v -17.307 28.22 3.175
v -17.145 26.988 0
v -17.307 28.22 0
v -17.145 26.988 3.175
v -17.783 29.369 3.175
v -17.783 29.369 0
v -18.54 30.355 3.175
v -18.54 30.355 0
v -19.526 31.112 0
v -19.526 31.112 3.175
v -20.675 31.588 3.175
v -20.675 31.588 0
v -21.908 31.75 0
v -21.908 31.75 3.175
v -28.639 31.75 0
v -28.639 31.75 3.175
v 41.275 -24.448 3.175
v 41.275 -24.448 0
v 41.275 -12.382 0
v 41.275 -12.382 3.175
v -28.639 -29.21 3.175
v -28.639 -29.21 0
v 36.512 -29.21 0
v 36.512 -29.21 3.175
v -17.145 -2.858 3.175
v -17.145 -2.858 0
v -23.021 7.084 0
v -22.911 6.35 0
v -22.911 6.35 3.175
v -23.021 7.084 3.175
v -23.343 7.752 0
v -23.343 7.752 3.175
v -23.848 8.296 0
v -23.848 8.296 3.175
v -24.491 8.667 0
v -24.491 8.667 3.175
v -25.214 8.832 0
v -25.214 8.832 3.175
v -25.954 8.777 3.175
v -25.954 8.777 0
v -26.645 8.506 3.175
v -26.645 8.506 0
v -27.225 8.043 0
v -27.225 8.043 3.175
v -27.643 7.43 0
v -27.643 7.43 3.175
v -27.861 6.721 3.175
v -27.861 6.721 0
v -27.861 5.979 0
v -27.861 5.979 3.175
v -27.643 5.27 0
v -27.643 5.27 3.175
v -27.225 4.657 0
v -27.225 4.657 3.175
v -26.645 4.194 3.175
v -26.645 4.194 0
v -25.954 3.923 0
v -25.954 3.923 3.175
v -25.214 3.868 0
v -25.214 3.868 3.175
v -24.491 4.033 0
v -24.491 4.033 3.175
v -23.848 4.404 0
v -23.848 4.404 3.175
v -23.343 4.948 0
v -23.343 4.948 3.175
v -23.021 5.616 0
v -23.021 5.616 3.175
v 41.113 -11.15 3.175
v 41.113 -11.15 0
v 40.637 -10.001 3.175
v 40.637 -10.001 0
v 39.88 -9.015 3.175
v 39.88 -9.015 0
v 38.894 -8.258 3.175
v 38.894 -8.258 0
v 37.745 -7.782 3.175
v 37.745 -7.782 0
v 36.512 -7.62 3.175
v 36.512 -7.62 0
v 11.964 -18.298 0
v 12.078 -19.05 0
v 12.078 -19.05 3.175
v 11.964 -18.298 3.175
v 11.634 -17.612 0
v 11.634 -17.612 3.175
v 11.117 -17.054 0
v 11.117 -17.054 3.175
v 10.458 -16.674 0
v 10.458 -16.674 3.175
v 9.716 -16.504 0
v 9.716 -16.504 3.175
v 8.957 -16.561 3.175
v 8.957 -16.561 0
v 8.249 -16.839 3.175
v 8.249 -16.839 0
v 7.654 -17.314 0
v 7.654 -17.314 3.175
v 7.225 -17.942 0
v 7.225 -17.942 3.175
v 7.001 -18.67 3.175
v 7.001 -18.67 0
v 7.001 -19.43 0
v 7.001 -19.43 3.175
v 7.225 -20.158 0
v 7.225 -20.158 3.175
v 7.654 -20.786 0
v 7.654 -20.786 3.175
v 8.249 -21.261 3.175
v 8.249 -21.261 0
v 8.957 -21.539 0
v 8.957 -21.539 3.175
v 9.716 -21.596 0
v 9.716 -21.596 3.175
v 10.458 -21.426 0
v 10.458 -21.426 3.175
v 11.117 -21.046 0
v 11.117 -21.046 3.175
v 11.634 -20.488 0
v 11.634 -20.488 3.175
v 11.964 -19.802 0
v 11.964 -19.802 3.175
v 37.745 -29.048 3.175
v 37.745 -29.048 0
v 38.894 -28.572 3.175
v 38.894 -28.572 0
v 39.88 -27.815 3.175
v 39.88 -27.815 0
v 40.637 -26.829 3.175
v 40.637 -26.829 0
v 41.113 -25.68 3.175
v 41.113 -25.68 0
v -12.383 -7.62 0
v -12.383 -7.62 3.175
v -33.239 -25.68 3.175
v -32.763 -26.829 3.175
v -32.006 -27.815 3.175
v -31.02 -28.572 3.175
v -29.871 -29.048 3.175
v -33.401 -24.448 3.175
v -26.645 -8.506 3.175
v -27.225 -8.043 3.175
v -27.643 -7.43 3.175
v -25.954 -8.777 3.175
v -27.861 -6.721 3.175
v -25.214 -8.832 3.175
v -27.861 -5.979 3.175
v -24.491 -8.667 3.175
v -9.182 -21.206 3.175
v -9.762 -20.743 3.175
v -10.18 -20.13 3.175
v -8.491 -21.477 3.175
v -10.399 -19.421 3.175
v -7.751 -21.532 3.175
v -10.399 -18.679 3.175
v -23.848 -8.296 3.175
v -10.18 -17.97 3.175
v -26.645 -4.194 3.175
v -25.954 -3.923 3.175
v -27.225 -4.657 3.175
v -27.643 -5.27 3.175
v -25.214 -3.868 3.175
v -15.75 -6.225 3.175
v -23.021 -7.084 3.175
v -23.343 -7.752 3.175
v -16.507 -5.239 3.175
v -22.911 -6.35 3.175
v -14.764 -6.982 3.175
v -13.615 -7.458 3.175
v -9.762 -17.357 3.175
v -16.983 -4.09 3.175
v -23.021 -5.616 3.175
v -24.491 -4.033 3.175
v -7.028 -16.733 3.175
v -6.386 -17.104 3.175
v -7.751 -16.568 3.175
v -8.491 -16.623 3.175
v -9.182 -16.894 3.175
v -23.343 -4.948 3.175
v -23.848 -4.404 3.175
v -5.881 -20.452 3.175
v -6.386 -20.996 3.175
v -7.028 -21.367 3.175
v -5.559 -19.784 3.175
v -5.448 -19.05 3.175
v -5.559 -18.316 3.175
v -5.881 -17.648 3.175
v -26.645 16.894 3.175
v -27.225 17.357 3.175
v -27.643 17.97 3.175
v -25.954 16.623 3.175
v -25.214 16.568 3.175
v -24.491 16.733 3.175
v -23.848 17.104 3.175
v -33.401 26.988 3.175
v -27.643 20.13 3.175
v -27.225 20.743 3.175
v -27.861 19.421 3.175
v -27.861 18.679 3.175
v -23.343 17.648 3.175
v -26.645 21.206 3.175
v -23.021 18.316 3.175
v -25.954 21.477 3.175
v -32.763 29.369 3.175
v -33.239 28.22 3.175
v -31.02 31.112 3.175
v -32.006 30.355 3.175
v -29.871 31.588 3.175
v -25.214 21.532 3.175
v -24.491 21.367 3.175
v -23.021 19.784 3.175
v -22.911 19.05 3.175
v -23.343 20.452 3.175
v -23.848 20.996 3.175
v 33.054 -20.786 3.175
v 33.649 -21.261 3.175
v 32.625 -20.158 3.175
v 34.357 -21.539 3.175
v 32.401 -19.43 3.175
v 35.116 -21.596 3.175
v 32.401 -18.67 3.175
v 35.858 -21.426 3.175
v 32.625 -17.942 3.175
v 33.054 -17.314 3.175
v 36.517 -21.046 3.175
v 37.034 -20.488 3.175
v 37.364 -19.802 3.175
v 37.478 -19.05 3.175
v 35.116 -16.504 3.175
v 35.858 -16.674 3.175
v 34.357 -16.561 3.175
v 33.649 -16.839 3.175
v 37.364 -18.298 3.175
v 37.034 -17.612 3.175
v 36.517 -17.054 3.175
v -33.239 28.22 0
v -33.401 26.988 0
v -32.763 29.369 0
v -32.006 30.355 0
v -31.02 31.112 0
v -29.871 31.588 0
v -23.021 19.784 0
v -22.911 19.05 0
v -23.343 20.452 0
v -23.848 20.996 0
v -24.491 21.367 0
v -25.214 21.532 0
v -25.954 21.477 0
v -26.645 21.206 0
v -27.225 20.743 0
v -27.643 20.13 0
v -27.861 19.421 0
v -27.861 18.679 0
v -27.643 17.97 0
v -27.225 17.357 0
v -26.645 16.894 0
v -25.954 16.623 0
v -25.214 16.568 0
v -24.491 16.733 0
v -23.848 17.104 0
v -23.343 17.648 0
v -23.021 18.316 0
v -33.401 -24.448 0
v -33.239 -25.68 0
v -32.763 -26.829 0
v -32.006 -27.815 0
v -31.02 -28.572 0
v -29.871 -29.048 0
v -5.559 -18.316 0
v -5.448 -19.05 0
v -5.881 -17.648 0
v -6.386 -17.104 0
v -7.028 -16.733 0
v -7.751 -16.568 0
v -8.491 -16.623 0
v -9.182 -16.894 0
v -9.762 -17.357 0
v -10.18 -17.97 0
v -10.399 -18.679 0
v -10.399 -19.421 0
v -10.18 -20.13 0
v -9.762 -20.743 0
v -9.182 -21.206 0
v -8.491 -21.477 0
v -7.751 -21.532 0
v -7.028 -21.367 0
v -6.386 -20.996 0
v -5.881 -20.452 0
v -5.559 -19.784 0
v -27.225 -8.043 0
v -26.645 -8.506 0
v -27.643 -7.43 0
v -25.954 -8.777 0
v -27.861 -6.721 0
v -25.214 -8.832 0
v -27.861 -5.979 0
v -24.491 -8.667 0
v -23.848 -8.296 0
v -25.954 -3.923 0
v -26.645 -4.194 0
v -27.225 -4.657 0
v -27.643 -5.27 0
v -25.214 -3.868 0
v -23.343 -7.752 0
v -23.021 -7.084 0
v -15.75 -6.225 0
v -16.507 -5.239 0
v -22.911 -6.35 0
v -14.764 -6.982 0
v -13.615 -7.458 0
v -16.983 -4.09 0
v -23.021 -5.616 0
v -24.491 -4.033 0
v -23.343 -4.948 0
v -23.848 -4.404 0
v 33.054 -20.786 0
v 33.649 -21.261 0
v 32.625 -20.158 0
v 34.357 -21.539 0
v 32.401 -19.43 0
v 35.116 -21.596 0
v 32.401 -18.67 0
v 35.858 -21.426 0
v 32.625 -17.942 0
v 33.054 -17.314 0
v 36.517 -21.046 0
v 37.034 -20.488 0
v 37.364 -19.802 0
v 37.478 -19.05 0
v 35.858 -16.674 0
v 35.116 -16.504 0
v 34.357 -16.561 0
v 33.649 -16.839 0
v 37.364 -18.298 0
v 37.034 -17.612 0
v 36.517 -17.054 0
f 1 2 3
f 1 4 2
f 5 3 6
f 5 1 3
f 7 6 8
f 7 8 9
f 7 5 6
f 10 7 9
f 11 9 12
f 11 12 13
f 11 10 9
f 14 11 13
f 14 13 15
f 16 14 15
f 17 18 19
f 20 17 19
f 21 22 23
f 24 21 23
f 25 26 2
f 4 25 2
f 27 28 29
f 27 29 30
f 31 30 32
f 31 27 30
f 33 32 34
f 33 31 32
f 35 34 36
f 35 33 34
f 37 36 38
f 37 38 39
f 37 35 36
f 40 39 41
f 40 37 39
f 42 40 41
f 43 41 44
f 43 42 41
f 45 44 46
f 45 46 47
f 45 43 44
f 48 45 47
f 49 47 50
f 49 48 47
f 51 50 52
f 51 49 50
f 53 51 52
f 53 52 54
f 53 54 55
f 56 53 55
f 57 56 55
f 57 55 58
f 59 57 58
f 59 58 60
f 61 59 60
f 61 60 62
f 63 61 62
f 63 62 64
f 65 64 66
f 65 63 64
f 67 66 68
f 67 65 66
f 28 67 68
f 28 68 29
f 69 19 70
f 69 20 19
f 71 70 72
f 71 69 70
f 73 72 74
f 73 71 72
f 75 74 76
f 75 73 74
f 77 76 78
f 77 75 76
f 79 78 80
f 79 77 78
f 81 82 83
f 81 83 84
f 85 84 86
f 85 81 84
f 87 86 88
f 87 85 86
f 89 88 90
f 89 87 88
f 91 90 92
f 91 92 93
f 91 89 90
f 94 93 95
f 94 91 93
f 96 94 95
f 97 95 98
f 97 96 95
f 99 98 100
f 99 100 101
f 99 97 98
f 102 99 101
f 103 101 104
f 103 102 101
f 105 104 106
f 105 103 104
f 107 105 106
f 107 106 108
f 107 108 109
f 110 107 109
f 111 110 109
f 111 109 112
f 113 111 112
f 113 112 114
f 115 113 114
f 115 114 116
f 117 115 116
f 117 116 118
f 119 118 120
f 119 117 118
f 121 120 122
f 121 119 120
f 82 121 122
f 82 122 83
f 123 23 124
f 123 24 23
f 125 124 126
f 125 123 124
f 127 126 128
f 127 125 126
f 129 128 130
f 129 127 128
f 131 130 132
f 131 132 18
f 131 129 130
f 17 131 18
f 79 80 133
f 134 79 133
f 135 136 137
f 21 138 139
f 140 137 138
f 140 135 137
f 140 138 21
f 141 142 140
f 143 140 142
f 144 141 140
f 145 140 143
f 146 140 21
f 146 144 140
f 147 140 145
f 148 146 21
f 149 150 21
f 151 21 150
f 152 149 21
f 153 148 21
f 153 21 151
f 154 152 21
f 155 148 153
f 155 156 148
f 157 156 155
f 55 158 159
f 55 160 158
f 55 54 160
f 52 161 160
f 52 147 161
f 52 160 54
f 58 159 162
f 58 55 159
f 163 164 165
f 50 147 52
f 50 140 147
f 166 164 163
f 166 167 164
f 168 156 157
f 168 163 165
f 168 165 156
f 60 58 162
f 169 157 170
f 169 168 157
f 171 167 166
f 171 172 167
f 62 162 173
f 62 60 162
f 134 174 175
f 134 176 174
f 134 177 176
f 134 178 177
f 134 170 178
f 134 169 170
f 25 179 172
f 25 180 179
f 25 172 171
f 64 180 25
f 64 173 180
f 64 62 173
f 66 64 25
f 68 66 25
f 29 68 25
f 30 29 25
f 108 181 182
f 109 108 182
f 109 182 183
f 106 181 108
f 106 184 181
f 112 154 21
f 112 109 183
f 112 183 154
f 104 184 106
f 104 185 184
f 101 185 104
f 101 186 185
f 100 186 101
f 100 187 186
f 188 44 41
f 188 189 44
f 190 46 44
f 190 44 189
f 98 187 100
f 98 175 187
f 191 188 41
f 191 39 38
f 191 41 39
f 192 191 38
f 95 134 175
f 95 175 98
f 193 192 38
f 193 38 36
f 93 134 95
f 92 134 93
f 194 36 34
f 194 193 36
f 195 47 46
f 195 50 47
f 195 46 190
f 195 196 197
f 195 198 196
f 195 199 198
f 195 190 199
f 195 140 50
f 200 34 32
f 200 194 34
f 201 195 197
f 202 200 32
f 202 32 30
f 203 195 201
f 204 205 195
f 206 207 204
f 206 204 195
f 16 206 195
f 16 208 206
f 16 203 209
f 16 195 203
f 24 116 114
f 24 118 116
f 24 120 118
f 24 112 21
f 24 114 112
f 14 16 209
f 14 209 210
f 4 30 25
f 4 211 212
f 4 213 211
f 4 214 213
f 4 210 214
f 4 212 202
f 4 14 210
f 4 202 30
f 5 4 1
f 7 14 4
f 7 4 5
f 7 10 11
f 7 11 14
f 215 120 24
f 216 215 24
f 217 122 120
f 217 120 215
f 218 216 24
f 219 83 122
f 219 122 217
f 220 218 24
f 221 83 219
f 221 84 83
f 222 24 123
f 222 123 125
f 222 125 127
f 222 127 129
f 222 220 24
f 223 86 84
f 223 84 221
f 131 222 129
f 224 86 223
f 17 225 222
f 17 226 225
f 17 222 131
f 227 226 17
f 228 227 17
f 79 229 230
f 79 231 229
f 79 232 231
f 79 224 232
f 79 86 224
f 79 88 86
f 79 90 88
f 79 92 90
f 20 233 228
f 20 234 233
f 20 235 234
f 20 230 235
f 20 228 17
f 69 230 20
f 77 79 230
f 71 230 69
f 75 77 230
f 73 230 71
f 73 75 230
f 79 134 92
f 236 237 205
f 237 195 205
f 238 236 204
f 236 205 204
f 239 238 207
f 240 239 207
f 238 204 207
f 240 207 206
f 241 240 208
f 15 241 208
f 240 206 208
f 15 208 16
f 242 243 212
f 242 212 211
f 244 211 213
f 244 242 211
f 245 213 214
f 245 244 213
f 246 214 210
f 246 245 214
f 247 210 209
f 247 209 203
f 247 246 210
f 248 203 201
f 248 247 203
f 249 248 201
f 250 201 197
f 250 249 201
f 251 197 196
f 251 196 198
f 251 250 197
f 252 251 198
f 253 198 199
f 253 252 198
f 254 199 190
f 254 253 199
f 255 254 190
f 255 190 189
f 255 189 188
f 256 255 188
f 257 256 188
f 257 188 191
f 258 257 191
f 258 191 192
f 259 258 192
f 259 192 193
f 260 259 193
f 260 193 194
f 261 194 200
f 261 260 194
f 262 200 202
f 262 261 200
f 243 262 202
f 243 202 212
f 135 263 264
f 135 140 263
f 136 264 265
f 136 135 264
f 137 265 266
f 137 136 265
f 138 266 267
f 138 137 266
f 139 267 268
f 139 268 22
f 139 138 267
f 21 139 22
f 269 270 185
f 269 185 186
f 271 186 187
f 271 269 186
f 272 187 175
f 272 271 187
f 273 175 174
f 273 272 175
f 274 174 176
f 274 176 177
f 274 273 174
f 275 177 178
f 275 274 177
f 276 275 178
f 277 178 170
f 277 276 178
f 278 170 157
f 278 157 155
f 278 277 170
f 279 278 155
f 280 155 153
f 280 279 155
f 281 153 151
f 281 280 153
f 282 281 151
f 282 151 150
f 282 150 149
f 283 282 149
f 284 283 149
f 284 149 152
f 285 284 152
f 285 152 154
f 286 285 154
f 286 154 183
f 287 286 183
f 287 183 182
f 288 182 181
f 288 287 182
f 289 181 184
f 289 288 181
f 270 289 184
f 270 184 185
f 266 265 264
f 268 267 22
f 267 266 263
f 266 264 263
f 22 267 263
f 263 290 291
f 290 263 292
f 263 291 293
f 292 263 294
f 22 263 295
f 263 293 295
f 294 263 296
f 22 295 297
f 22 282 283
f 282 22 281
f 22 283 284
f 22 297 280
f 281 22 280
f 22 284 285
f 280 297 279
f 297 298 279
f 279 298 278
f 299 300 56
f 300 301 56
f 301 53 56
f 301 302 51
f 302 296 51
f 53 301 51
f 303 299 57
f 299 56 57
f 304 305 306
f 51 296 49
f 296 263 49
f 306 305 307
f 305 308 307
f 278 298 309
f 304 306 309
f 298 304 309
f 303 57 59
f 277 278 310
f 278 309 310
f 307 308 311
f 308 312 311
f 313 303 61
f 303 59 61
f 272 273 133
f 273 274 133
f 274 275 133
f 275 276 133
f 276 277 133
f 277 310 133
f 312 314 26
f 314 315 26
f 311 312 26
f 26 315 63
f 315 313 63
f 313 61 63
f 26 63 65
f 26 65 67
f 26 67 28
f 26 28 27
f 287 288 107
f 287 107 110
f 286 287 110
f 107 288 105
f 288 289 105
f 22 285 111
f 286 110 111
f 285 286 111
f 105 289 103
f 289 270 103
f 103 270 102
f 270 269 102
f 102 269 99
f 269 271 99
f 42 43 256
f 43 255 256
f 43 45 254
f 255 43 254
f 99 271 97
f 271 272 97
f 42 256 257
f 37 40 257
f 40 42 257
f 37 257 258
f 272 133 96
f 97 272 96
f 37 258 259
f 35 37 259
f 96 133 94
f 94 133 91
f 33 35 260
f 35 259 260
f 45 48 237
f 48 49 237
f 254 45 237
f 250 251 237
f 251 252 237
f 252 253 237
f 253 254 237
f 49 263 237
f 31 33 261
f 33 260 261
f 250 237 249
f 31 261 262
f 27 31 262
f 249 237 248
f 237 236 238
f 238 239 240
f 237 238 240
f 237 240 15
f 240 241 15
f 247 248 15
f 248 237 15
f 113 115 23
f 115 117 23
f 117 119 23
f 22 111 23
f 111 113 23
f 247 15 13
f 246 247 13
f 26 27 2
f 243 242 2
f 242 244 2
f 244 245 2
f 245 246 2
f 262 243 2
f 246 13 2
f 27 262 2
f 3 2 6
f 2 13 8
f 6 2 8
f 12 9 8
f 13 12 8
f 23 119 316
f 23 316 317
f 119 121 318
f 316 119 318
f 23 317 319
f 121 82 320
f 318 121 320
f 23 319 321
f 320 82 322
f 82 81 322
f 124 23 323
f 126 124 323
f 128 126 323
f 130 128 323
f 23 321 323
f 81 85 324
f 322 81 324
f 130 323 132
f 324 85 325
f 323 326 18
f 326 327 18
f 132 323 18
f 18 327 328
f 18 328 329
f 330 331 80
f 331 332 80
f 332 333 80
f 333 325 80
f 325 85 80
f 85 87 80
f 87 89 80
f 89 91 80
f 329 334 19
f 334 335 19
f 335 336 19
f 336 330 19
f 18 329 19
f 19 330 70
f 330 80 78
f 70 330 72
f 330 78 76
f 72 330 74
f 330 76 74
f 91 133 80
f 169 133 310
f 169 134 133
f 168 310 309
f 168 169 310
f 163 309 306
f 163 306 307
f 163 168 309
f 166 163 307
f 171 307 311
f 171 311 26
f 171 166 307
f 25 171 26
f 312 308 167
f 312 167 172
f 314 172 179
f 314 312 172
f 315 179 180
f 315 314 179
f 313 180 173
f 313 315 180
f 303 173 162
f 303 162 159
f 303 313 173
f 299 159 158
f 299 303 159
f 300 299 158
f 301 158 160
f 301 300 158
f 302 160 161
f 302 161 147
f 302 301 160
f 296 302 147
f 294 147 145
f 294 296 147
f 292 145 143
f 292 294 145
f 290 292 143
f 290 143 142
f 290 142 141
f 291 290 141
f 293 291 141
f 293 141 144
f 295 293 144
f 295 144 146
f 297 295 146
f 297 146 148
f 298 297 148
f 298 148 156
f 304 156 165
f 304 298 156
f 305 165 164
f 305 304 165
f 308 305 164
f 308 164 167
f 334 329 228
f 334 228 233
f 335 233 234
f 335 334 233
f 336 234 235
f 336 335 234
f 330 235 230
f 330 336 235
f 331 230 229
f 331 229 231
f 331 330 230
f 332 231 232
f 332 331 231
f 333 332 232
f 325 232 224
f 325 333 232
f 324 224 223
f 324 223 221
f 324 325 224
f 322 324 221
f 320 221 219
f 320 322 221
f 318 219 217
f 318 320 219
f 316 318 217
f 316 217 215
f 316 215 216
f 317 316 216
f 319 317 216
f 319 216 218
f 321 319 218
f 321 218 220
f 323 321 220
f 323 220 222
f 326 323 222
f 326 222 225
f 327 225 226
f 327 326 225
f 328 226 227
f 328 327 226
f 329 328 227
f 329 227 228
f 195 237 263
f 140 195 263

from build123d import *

# Parameters (mm, degrees)
SKETCH1_R           = 2.4892
SKETCH1_R_2         = 2.5527
BOSS_EXTRUDE1_DEPTH = 3.175
FILLET1_R           = 4.7625


with BuildPart() as part:
    # Sketch1 → Boss-Extrude1 (new body)
    with BuildSketch(Plane.XY):
        Polygon((-33.401, 31.75), (-33.401, -29.21), (41.275, -29.21), (41.275, -7.62), (-17.145, -7.62), (-17.145, 31.75), align=None)
        with Locations((-25.4, -19.05)):
            Circle(SKETCH1_R, mode=Mode.SUBTRACT)
        with Locations((-7.9375, -19.05)):
            Circle(SKETCH1_R, mode=Mode.SUBTRACT)
        with Locations((-25.4, -6.35)):
            Circle(SKETCH1_R, mode=Mode.SUBTRACT)
        with Locations((9.525, -19.05)):
            Circle(SKETCH1_R_2, mode=Mode.SUBTRACT)
        with Locations((34.925, -19.05)):
            Circle(SKETCH1_R_2, mode=Mode.SUBTRACT)
        with Locations((-25.4, 6.35)):
            Circle(SKETCH1_R, mode=Mode.SUBTRACT)
        with Locations((-25.4, 19.05)):
            Circle(SKETCH1_R, mode=Mode.SUBTRACT)
        with Locations((-25.4, -19.05)):
            Circle(SKETCH1_R)
    extrude(amount=BOSS_EXTRUDE1_DEPTH)

    # Fillet1
    fillet1_edges = [part.edges().sort_by_distance(p)[0] for p in [
        (-33.401, 31.75, 1.5875),
        (-17.145, 31.75, 1.5875),
        (-17.145, -7.62, 1.5875),
        (41.275, -7.62, 1.5875),
        (41.275, -29.21, 1.5875),
        (-33.401, -29.21, 1.5875),
    ]]
    fillet(fillet1_edges, radius=FILLET1_R)


solid = part.part
